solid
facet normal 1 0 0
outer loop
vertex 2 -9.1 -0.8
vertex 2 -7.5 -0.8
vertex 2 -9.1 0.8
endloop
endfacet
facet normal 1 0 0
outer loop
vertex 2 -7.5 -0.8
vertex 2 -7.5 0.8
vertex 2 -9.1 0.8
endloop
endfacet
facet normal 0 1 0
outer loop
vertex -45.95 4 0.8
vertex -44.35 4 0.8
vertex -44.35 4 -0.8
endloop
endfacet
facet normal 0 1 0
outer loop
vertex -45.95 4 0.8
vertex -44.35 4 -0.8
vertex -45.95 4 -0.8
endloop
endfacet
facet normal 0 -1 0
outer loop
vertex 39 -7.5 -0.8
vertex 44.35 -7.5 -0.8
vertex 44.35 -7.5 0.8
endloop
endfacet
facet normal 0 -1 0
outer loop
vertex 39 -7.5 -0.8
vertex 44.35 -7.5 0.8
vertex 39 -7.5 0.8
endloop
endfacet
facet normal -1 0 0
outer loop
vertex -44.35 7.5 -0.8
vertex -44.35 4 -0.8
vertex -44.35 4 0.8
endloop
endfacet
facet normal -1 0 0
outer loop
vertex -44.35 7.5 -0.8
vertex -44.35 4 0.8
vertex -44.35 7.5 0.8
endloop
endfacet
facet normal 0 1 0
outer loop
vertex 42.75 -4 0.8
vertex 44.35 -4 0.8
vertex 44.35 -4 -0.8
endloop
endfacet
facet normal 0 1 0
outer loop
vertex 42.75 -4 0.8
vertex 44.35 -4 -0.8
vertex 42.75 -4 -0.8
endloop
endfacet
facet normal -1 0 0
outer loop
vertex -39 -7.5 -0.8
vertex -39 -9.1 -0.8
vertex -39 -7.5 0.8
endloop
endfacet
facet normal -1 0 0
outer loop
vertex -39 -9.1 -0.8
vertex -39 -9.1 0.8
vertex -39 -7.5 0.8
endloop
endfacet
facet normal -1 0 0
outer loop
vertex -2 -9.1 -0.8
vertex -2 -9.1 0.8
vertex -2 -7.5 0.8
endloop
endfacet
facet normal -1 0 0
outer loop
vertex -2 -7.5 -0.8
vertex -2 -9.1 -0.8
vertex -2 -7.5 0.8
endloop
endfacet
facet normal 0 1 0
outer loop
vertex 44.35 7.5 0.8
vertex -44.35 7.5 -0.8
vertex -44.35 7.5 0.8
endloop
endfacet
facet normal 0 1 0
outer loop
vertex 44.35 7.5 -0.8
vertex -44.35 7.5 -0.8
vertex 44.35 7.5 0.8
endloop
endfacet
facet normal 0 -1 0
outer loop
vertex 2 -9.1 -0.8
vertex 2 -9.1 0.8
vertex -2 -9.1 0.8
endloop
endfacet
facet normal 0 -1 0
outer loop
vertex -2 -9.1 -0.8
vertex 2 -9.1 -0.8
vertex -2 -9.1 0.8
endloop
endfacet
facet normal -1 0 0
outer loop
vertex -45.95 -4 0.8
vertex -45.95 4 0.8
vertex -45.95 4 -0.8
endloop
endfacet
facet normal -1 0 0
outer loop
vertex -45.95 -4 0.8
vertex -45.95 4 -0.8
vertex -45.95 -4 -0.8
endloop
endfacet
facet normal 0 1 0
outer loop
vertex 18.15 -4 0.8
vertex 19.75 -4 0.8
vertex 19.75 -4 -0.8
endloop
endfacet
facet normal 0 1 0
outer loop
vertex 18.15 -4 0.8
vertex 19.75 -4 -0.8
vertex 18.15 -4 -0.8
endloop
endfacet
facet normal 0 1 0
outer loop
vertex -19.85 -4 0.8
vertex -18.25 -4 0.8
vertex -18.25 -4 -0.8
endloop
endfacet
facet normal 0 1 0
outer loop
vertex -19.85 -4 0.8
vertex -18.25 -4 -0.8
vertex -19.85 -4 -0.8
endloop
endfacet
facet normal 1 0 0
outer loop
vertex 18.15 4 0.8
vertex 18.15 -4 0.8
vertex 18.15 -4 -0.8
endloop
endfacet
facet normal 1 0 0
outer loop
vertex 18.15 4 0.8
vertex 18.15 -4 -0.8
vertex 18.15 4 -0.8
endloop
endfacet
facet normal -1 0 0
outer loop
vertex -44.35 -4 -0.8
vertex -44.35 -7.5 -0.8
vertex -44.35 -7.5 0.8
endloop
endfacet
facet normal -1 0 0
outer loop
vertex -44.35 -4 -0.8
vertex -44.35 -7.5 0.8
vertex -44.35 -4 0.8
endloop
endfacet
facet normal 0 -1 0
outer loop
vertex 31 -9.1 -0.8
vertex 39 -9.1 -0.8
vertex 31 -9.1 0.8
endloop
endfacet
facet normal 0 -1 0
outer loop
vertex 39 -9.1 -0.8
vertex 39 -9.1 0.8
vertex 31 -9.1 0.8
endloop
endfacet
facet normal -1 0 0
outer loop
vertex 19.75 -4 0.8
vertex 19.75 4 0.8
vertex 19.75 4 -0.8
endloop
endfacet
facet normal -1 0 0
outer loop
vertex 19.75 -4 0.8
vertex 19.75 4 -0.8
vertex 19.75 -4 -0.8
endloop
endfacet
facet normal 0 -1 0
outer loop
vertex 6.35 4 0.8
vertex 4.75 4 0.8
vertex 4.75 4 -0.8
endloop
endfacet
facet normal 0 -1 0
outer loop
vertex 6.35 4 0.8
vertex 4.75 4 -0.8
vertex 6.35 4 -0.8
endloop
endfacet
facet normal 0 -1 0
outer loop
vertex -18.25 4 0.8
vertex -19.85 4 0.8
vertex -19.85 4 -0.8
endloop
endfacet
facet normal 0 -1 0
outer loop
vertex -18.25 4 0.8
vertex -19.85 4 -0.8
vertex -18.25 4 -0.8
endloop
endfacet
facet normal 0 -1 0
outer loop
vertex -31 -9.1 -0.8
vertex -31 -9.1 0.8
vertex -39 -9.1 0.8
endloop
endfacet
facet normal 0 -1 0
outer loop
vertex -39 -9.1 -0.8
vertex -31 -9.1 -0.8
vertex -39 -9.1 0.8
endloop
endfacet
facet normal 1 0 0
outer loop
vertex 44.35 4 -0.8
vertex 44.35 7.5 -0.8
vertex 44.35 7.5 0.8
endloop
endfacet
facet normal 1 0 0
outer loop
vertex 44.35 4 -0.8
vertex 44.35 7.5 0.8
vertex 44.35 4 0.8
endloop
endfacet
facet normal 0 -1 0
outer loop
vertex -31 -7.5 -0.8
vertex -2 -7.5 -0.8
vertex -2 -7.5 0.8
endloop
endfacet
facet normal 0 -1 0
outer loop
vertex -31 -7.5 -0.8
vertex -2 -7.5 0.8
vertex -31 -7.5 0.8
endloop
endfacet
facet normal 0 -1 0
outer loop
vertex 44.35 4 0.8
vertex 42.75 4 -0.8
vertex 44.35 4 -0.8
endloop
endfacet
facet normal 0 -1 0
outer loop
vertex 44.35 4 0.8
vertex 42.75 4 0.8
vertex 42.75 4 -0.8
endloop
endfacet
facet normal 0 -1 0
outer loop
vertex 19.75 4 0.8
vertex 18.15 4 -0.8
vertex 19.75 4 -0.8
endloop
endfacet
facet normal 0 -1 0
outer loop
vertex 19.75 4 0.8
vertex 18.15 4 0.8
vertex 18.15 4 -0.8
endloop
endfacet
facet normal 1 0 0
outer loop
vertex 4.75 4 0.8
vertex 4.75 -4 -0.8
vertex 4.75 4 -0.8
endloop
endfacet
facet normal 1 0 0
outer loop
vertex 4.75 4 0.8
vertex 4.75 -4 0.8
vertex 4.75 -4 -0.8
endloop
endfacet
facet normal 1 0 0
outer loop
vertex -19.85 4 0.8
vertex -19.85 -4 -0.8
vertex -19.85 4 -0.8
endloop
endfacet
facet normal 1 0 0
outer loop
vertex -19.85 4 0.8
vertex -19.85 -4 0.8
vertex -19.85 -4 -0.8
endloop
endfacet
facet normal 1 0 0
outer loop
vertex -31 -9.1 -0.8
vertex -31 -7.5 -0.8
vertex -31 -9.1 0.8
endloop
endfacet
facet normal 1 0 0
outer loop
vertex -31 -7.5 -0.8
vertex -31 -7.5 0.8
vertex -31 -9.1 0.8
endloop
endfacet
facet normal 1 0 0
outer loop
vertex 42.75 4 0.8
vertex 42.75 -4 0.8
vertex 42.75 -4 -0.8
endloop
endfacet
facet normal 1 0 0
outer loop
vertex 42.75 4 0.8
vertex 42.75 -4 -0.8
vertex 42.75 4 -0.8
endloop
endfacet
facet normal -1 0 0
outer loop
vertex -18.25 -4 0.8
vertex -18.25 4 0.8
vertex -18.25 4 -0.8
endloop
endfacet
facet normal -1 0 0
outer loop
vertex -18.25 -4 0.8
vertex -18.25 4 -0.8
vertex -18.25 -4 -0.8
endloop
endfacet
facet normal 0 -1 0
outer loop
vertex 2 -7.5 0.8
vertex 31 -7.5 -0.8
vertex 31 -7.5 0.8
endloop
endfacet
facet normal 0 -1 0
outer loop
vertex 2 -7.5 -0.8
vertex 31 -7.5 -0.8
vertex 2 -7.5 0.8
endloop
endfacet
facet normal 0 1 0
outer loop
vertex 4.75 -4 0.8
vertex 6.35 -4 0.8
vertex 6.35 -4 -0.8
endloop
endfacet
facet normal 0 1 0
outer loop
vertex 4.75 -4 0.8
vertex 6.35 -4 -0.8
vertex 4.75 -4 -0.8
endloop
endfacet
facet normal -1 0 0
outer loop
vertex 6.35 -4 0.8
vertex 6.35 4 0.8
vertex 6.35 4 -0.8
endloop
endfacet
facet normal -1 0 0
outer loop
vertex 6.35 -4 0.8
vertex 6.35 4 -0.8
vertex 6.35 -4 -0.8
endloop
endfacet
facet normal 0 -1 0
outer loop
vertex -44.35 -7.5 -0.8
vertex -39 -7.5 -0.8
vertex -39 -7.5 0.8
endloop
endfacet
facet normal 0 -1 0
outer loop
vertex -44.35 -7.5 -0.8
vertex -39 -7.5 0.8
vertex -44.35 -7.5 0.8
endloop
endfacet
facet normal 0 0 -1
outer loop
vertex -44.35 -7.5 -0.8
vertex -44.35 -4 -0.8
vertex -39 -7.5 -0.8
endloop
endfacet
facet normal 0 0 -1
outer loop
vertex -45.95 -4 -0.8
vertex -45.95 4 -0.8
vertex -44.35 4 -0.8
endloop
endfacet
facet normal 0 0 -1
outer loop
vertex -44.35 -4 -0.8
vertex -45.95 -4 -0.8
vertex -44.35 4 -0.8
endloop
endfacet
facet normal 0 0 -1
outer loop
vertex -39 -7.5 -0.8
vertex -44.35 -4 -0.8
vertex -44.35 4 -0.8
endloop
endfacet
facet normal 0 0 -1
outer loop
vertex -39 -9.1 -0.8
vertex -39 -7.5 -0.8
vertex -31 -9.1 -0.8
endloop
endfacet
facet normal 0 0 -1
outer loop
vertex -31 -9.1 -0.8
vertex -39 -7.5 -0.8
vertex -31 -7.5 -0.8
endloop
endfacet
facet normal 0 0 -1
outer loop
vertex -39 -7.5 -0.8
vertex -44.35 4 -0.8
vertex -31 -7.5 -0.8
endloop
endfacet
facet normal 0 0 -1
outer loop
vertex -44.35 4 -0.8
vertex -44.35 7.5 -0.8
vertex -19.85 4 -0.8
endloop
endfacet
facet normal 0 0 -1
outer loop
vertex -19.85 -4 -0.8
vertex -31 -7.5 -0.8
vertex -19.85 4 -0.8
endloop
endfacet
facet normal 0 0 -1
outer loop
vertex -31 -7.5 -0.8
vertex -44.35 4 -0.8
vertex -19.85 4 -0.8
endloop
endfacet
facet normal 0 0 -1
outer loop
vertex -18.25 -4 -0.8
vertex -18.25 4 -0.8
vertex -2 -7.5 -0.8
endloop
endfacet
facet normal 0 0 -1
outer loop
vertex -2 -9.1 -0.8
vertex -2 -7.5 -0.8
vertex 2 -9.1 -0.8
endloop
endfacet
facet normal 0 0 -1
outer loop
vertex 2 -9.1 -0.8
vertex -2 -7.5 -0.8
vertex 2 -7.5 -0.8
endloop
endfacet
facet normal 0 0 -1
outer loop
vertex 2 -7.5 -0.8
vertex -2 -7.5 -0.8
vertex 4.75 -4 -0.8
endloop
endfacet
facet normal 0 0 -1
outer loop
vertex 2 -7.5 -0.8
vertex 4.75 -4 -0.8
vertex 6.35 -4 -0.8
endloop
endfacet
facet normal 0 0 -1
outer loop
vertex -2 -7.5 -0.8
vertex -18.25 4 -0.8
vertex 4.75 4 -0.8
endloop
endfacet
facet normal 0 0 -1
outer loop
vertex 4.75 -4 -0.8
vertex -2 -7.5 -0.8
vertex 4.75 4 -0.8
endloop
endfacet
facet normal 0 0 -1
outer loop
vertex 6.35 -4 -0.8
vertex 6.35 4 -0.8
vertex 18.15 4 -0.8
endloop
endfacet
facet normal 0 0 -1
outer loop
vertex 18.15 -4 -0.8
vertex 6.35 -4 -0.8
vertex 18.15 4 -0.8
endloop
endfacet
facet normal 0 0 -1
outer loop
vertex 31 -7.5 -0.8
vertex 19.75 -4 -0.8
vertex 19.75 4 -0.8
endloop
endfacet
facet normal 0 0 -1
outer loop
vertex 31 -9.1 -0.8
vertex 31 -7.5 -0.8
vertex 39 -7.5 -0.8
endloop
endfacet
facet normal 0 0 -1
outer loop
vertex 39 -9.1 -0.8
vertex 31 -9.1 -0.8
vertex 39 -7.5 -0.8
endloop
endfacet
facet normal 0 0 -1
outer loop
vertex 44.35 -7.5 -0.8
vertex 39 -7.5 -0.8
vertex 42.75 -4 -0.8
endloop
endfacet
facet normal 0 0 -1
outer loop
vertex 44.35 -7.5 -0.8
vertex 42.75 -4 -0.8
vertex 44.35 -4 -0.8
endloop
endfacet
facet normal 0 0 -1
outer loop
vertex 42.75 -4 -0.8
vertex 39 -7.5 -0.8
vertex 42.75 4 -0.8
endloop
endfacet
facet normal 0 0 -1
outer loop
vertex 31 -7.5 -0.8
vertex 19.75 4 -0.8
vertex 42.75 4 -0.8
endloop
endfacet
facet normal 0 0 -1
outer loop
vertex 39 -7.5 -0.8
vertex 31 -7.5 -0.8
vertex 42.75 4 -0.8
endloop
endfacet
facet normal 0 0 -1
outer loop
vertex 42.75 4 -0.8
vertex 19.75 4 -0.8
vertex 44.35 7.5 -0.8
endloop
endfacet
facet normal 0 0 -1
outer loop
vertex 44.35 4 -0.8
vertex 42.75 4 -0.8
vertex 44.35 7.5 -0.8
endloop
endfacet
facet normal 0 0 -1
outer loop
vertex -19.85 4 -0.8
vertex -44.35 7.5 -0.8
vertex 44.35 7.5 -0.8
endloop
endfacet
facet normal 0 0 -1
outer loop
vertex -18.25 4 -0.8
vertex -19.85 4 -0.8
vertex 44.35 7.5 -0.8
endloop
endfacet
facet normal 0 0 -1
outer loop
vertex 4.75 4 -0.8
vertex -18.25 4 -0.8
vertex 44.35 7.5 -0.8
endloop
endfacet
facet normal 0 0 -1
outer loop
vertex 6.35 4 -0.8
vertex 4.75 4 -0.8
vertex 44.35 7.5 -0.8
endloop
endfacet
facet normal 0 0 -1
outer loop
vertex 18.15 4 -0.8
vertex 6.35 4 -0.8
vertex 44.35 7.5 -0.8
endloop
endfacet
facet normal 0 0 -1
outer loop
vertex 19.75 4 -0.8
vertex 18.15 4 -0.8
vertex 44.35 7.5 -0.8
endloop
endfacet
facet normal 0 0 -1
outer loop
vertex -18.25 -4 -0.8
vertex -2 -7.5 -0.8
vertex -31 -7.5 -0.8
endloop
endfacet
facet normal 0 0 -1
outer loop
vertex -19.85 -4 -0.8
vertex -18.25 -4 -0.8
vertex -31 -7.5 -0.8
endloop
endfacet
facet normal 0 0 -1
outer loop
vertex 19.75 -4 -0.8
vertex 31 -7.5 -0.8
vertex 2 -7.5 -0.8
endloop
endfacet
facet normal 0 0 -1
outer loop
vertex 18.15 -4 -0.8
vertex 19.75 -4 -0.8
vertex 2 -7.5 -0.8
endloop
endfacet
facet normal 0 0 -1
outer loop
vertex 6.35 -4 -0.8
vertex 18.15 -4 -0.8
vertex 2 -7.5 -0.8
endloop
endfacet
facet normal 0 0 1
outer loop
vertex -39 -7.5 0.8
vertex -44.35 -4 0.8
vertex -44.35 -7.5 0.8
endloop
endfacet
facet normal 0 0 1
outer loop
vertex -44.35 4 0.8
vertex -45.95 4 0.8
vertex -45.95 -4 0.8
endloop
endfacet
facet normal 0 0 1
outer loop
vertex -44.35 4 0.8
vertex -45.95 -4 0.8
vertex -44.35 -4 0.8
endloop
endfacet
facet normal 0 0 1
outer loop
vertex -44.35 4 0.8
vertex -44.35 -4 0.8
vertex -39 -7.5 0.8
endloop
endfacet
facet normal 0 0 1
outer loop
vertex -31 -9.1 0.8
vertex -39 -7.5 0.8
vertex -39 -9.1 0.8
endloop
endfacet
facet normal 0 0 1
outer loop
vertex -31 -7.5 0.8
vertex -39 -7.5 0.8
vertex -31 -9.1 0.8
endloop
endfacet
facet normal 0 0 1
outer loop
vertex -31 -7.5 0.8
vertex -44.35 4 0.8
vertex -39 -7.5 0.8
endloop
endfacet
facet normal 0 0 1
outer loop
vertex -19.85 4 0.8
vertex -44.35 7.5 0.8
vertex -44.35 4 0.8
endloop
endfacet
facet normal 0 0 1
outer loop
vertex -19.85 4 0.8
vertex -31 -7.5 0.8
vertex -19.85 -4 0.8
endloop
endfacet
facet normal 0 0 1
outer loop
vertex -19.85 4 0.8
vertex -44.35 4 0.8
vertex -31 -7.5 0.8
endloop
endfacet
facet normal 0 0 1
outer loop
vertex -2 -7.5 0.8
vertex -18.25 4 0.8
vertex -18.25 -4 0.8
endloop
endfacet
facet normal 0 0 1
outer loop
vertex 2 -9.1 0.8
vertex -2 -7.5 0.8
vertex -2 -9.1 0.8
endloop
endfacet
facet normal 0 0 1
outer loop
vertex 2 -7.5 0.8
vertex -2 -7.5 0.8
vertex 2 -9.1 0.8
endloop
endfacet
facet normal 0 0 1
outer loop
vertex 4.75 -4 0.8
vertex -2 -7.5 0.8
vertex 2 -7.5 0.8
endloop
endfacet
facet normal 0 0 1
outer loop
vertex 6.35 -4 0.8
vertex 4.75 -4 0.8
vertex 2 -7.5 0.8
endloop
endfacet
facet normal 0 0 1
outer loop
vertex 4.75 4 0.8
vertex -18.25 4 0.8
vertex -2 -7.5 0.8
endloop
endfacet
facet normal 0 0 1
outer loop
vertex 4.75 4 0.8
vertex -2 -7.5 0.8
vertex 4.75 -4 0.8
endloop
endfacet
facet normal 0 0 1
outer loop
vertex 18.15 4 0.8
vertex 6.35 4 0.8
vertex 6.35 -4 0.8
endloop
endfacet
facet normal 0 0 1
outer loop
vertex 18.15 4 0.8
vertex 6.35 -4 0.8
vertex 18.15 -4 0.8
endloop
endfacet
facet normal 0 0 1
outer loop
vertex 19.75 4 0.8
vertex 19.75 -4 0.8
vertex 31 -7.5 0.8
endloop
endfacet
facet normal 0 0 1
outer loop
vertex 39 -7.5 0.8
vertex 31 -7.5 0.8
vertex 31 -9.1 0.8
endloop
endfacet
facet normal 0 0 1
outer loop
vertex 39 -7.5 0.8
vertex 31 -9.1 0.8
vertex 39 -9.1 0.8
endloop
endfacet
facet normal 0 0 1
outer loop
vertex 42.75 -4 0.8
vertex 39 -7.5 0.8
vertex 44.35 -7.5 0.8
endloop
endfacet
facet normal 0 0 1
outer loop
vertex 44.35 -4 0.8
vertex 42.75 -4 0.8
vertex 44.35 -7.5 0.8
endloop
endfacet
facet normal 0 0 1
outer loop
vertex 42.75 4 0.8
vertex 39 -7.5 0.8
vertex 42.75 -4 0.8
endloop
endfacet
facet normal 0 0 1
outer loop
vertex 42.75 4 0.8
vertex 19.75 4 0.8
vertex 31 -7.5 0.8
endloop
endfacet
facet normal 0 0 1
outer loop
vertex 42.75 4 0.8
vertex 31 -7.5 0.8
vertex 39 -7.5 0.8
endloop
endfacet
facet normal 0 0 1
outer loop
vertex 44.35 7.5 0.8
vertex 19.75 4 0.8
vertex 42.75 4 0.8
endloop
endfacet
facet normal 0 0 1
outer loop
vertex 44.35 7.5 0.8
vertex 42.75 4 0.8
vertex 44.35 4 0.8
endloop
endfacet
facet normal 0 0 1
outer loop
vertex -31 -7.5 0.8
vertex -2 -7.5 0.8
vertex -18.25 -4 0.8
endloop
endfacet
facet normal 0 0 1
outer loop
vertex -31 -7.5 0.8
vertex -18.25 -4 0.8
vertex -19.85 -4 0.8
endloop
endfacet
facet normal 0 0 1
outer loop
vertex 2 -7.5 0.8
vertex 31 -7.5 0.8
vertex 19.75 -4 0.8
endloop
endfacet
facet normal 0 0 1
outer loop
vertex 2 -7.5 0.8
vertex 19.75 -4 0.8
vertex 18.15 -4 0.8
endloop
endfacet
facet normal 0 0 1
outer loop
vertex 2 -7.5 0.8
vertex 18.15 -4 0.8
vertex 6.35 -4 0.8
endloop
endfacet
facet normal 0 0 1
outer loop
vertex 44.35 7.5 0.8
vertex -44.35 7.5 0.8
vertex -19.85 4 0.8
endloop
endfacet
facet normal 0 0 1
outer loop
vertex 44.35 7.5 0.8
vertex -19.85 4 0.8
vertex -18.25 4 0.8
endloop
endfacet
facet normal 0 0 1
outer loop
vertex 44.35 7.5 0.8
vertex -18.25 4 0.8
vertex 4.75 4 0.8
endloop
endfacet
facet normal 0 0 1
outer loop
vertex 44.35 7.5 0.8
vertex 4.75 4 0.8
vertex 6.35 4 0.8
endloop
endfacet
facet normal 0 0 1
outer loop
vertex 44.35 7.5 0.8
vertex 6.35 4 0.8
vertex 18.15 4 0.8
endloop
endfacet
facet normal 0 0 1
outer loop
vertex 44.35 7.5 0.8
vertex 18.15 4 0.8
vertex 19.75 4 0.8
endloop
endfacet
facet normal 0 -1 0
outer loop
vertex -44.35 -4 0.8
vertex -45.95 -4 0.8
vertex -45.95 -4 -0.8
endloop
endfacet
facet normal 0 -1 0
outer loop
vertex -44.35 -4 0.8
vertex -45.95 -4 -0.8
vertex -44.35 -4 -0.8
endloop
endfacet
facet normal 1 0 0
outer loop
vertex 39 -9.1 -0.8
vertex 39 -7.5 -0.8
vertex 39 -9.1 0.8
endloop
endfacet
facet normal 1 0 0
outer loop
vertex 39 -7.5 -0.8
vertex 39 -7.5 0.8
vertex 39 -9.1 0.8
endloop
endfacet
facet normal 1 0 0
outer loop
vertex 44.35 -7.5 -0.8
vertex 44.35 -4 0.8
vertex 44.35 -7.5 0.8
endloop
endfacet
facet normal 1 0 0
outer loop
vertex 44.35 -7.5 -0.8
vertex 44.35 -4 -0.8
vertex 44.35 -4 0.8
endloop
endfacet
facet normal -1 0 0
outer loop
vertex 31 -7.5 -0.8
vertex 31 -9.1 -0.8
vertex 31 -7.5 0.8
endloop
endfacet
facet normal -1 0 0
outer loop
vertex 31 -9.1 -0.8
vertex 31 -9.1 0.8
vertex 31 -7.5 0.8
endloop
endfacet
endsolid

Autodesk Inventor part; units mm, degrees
ref_plane "YZ Plane" through (0, 0, 0) normal (1, 0, 0) x (0, 1, 0)
ref_plane "XZ Plane" through (0, 0, 0) normal (0, 1, 0) x (-1, 0, 0)
ref_plane "XY Plane" through (0, 0, 0) normal (0, 0, 1) x (1, 0, 0)
sketch "Sketch1" plane through (0, 0, 0) normal (0, 0, 1) x (1, 0, 0)
  line L0 (-62.09, 0) -> (62.09, 0) construction
  line L1 (0, 10.5) -> (0, -10.5) construction
  line L2 (44.35, -7.5) -> (-44.35, -7.5)
  line L3 (-44.35, -7.5) -> (-44.35, 7.5)
  line L4 (-44.35, 7.5) -> (44.35, 7.5)
  line L5 (44.35, 7.5) -> (44.35, -7.5)
  line L6 (44.35, -7.5) -> (-44.35, 7.5) construction
  line L7 (-44.35, -7.5) -> (44.35, 7.5) construction
  point P0 (0, 0)
  dimension "d0" = 88.7
  dimension "d1" = 15
extrude "Extrusion1" add sketch "Sketch1" along normal mid plane 1.6
sketch "Esquisse2" plane through (0, 0, 0.8) normal (0, 0, 1) x (1, 0, 0)
  line L0 (-44.35, -7.5) -> (44.35, -7.5) construction
  line L1 (44.35, -7.5) -> (44.35, 7.5) construction
  line L2 (44.35, 7.5) -> (-44.35, 7.5) construction
  line L3 (-44.35, 7.5) -> (-44.35, -7.5) construction
  line L4 (0, 10.82) -> (0, -12.42) construction
  line L5 (-62.09, 0) -> (62.09, 0) construction
  line L6 (-39, -7.5) -> (-31, -7.5)
  line L7 (-31, -7.5) -> (-31, -9.1)
  line L8 (-31, -9.1) -> (-39, -9.1)
  line L9 (-39, -9.1) -> (-39, -7.5)
  line L10 (31, -7.5) -> (39, -7.5)
  line L11 (39, -7.5) -> (39, -9.1)
  line L12 (39, -9.1) -> (31, -9.1)
  line L13 (31, -9.1) -> (31, -7.5)
  line L14 (-2, -7.5) -> (2, -7.5)
  line L15 (2, -7.5) -> (2, -9.1)
  line L16 (2, -9.1) -> (-2, -9.1)
  line L17 (-2, -9.1) -> (-2, -7.5)
  point P0 (0, 0)
  dimension "d4" = 8
  dimension "d5" = 1.6
  dimension "d8" = 70
  dimension "d13" = 4
  dimension "d14" = 1.6
extrude "Extrusion2" add sketch "Esquisse2" against normal blind 1.6
sketch "Esquisse3" plane through (0, 0, 0.8) normal (0, 0, 1) x (1, 0, 0)
  line L0 (-44.35, -7.5) -> (-39, -7.5) construction
  line L1 (-39, -9.1) -> (-39, -7.5) construction
  line L2 (-31, -9.1) -> (-39, -9.1) construction
  line L3 (-31, -7.5) -> (-31, -9.1) construction
  line L4 (-31, -7.5) -> (-2, -7.5) construction
  line L5 (-2, -9.1) -> (-2, -7.5) construction
  line L6 (2, -9.1) -> (-2, -9.1) construction
  line L7 (2, -7.5) -> (2, -9.1) construction
  line L8 (2, -7.5) -> (31, -7.5) construction
  line L9 (31, -9.1) -> (31, -7.5) construction
  line L10 (39, -9.1) -> (31, -9.1) construction
  line L11 (39, -7.5) -> (39, -9.1) construction
  line L12 (39, -7.5) -> (44.35, -7.5) construction
  line L13 (44.35, -7.5) -> (44.35, 7.5) construction
  line L14 (44.35, 7.5) -> (-44.35, 7.5) construction
  line L15 (-44.35, 7.5) -> (-44.35, -7.5) construction
  line L16 (0, 10.82) -> (0, -12.42) construction
  line L17 (-64.01, 0) -> (62.41, 0) construction
  line L18 (-44.35, 4) -> (-45.95, 4)
  line L19 (-45.95, 4) -> (-45.95, -4)
  line L20 (-45.95, -4) -> (-44.35, -4)
  line L21 (-44.35, -4) -> (-44.35, 4)
  point P0 (0, 0)
  dimension "d17" = 1.6
  dimension "d18" = 8
extrude "Extrusion3" add sketch "Esquisse3" against normal blind 1.6
sketch "Esquisse4" plane through (0, 0, 0.8) normal (0, 0, 1) x (1, 0, 0)
  line L0 (-18.25, -4) -> (-19.85, -4)
  line L1 (-19.85, -4) -> (-19.85, 4)
  line L2 (-19.85, 4) -> (-18.25, 4)
  line L3 (-18.25, 4) -> (-18.25, -4)
  line L4 (6.35, -4) -> (4.75, -4)
  line L5 (4.75, -4) -> (4.75, 4)
  line L6 (4.75, 4) -> (6.35, 4)
  line L7 (6.35, 4) -> (6.35, -4)
  line L8 (19.75, -4) -> (18.15, -4)
  line L9 (18.15, -4) -> (18.15, 4)
  line L10 (18.15, 4) -> (19.75, 4)
  line L11 (19.75, 4) -> (19.75, -4)
  line L12 (44.35, -4) -> (42.75, -4)
  line L13 (42.75, -4) -> (42.75, 4)
  line L14 (42.75, 4) -> (44.35, 4)
  line L15 (44.35, 4) -> (44.35, -4)
  point P0 (0, 0)
extrude "Extrusion4" cut sketch "Esquisse4" against normal blind 1.6
properties part number "FixationBatterieLateral" material "PVC-U"
